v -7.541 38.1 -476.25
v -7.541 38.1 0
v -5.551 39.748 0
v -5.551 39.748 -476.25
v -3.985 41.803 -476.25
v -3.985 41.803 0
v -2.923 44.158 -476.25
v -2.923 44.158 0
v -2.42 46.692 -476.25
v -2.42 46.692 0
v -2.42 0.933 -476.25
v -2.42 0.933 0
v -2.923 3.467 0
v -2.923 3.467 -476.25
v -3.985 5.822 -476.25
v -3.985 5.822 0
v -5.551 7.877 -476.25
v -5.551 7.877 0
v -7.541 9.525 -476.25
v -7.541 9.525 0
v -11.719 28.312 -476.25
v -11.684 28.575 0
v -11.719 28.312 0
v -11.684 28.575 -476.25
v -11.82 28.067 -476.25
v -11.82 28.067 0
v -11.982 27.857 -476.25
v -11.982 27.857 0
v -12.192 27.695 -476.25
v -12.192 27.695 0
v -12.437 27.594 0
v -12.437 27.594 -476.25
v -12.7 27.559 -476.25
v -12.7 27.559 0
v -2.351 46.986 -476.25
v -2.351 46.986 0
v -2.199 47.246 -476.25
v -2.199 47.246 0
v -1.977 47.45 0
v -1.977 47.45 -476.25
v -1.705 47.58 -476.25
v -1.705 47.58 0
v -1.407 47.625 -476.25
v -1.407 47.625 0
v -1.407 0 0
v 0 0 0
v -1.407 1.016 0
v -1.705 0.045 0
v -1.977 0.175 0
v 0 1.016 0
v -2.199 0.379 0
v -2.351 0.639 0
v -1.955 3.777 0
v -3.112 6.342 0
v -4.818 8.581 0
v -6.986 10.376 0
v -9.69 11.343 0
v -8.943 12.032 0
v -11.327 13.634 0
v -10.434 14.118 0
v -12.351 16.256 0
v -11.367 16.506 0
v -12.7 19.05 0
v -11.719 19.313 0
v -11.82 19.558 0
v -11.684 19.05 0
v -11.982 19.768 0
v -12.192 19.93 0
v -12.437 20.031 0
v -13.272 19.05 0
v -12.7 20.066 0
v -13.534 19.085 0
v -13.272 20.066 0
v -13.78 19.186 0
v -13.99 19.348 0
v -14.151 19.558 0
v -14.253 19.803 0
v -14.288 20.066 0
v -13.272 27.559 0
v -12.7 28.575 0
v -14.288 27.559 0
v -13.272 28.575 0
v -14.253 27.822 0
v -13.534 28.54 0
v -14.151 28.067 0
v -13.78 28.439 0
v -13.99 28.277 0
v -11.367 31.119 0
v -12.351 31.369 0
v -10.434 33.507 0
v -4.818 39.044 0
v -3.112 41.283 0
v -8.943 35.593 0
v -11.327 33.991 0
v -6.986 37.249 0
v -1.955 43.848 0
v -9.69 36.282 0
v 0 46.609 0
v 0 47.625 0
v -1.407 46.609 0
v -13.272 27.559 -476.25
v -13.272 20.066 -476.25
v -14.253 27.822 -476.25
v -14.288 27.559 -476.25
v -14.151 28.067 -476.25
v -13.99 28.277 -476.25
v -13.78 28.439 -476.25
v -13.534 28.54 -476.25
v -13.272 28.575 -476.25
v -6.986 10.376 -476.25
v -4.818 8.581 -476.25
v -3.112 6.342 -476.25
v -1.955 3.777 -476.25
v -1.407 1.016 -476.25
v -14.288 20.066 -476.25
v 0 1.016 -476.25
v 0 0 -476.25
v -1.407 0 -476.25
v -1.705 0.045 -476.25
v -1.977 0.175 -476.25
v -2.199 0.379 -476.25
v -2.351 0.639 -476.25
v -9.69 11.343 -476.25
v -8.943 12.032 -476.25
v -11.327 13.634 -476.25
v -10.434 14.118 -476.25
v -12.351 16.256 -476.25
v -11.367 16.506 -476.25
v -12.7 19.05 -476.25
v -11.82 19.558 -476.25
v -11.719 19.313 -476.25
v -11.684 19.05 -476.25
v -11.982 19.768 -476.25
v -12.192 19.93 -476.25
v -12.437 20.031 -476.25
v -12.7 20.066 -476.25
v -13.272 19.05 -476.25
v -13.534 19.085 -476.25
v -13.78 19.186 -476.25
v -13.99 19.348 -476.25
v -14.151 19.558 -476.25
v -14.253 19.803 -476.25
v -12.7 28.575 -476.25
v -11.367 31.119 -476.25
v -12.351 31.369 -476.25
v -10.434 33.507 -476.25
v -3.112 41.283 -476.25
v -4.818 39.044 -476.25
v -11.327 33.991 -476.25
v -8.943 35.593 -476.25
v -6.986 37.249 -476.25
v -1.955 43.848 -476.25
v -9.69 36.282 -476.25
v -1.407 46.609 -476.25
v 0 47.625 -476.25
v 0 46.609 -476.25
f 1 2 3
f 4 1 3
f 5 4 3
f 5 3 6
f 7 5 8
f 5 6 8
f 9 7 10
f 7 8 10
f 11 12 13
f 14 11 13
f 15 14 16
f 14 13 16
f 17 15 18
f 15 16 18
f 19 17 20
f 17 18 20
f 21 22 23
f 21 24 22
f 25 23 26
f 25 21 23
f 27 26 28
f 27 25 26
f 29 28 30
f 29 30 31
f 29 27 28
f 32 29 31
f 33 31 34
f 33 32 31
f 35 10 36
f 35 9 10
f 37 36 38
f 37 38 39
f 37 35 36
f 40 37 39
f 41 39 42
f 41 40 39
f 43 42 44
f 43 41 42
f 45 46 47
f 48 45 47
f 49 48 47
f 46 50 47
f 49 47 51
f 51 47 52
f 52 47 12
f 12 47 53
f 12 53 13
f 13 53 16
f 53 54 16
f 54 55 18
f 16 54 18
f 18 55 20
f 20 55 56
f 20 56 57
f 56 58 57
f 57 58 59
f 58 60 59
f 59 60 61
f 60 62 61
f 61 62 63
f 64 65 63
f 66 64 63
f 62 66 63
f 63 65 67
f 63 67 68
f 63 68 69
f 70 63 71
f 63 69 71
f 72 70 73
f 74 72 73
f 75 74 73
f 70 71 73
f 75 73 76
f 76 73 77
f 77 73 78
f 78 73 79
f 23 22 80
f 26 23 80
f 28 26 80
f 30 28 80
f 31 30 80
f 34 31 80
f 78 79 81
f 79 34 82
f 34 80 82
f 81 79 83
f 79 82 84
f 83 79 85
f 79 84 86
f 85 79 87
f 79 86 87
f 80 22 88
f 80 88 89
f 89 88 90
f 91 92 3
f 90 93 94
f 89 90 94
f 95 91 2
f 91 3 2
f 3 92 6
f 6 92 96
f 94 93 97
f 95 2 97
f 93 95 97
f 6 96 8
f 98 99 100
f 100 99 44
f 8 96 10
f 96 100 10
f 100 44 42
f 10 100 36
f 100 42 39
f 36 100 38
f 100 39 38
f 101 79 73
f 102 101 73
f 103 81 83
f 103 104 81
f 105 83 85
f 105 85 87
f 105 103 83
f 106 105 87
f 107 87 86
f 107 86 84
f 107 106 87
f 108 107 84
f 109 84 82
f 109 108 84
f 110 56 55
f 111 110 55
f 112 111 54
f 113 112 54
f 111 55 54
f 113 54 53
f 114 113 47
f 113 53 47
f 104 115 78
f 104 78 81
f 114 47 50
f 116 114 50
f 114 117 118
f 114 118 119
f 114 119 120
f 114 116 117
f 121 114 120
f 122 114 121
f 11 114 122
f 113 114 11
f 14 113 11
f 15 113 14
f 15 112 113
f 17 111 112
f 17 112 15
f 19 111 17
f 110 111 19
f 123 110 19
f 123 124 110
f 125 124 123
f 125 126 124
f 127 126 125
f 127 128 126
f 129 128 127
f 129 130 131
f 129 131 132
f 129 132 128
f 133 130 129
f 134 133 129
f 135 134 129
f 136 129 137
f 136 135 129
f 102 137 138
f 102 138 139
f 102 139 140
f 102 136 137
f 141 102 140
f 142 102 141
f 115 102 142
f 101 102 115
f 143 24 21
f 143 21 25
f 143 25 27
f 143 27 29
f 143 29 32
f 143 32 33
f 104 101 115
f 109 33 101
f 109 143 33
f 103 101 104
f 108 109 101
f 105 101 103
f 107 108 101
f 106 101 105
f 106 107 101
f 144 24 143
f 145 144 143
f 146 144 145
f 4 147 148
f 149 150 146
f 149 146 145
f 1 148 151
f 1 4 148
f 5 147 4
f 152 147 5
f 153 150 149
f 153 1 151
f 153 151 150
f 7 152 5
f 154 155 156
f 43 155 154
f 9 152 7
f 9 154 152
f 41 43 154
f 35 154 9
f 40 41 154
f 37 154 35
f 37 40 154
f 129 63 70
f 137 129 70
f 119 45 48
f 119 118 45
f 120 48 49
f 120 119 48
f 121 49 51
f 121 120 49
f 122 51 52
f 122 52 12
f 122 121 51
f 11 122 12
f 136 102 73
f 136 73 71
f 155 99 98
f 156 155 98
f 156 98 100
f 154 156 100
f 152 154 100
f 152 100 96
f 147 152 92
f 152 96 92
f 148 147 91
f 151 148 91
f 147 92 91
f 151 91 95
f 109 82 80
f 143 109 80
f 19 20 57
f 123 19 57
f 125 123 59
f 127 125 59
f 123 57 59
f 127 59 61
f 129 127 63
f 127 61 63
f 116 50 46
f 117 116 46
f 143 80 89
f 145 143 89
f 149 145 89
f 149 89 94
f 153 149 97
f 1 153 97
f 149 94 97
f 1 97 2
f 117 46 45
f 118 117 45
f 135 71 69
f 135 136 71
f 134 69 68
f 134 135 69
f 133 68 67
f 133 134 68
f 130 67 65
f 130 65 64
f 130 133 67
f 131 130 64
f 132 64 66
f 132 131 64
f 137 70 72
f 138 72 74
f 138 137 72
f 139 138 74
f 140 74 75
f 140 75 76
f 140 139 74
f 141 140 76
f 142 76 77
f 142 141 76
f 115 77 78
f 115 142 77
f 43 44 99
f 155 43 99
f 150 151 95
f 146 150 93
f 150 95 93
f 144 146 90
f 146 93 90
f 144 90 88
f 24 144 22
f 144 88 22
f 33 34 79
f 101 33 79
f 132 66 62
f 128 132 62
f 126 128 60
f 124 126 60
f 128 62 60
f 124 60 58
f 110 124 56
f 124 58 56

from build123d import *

# Parameters (mm, degrees)
EXTRUDE_THIN1_DEPTH = 476.25
FILLET1_R           = 1.016


with BuildPart() as part:
    # Sketch1 → Extrude-Thin1 (new body)
    with BuildSketch(Plane.XY):
        with BuildLine():
            Line((0, 0), (-2.38125, 0))
            ThreePointArc((-2.38125, 0), (-3.753941176, 5.416289675), (-7.540625, 9.525))
            ThreePointArc((-7.540625, 9.525), (-11.327308824, 13.633710325), (-12.7, 19.05))
            Line((-12.7, 19.05), (-14.2875, 19.05))
            Line((-14.2875, 19.05), (-14.2875, 28.575))
            Line((-14.2875, 28.575), (-12.7, 28.575))
            ThreePointArc((-12.7, 28.575), (-11.327308824, 33.991289675), (-7.540625, 38.1))
            ThreePointArc((-7.540625, 38.1), (-3.753941176, 42.208710325), (-2.38125, 47.625))
            Line((-2.38125, 47.625), (0, 47.625))
            Line((0, 47.625), (0, 46.609))
            Line((0, 46.609), (-1.40698386, 46.609))
            ThreePointArc((-1.40698386, 46.609), (-3.111914342, 41.282721024), (-6.985575336, 37.249014765))
            ThreePointArc((-6.985575336, 37.249014765), (-10.665203574, 33.054213727), (-11.634040924, 27.559))
            Line((-11.634040924, 27.559), (-13.2715, 27.559))
            Line((-13.2715, 27.559), (-13.2715, 20.066))
            Line((-13.2715, 20.066), (-11.634040924, 20.066))
            ThreePointArc((-11.634040924, 20.066), (-10.665203574, 14.570786273), (-6.985575336, 10.375985235))
            ThreePointArc((-6.985575336, 10.375985235), (-3.111914342, 6.342278976), (-1.40698386, 1.016))
            Line((-1.40698386, 1.016), (0, 1.016))
            Line((0, 1.016), (0, 0))
        make_face()
    extrude(amount=-EXTRUDE_THIN1_DEPTH)

    # Fillet1
    fillet1_edges = [part.edges().sort_by_distance(p)[0] for p in [
        (-2.38125, 0, -238.125),
        (-14.2875, 19.05, -238.125),
        (-14.2875, 28.575, -238.125),
        (-2.38125, 47.625, -238.125),
        (-11.634040924, 27.559, -238.125),
        (-11.634040924, 20.066, -238.125),
    ]]
    fillet(fillet1_edges, radius=FILLET1_R)


solid = part.part
